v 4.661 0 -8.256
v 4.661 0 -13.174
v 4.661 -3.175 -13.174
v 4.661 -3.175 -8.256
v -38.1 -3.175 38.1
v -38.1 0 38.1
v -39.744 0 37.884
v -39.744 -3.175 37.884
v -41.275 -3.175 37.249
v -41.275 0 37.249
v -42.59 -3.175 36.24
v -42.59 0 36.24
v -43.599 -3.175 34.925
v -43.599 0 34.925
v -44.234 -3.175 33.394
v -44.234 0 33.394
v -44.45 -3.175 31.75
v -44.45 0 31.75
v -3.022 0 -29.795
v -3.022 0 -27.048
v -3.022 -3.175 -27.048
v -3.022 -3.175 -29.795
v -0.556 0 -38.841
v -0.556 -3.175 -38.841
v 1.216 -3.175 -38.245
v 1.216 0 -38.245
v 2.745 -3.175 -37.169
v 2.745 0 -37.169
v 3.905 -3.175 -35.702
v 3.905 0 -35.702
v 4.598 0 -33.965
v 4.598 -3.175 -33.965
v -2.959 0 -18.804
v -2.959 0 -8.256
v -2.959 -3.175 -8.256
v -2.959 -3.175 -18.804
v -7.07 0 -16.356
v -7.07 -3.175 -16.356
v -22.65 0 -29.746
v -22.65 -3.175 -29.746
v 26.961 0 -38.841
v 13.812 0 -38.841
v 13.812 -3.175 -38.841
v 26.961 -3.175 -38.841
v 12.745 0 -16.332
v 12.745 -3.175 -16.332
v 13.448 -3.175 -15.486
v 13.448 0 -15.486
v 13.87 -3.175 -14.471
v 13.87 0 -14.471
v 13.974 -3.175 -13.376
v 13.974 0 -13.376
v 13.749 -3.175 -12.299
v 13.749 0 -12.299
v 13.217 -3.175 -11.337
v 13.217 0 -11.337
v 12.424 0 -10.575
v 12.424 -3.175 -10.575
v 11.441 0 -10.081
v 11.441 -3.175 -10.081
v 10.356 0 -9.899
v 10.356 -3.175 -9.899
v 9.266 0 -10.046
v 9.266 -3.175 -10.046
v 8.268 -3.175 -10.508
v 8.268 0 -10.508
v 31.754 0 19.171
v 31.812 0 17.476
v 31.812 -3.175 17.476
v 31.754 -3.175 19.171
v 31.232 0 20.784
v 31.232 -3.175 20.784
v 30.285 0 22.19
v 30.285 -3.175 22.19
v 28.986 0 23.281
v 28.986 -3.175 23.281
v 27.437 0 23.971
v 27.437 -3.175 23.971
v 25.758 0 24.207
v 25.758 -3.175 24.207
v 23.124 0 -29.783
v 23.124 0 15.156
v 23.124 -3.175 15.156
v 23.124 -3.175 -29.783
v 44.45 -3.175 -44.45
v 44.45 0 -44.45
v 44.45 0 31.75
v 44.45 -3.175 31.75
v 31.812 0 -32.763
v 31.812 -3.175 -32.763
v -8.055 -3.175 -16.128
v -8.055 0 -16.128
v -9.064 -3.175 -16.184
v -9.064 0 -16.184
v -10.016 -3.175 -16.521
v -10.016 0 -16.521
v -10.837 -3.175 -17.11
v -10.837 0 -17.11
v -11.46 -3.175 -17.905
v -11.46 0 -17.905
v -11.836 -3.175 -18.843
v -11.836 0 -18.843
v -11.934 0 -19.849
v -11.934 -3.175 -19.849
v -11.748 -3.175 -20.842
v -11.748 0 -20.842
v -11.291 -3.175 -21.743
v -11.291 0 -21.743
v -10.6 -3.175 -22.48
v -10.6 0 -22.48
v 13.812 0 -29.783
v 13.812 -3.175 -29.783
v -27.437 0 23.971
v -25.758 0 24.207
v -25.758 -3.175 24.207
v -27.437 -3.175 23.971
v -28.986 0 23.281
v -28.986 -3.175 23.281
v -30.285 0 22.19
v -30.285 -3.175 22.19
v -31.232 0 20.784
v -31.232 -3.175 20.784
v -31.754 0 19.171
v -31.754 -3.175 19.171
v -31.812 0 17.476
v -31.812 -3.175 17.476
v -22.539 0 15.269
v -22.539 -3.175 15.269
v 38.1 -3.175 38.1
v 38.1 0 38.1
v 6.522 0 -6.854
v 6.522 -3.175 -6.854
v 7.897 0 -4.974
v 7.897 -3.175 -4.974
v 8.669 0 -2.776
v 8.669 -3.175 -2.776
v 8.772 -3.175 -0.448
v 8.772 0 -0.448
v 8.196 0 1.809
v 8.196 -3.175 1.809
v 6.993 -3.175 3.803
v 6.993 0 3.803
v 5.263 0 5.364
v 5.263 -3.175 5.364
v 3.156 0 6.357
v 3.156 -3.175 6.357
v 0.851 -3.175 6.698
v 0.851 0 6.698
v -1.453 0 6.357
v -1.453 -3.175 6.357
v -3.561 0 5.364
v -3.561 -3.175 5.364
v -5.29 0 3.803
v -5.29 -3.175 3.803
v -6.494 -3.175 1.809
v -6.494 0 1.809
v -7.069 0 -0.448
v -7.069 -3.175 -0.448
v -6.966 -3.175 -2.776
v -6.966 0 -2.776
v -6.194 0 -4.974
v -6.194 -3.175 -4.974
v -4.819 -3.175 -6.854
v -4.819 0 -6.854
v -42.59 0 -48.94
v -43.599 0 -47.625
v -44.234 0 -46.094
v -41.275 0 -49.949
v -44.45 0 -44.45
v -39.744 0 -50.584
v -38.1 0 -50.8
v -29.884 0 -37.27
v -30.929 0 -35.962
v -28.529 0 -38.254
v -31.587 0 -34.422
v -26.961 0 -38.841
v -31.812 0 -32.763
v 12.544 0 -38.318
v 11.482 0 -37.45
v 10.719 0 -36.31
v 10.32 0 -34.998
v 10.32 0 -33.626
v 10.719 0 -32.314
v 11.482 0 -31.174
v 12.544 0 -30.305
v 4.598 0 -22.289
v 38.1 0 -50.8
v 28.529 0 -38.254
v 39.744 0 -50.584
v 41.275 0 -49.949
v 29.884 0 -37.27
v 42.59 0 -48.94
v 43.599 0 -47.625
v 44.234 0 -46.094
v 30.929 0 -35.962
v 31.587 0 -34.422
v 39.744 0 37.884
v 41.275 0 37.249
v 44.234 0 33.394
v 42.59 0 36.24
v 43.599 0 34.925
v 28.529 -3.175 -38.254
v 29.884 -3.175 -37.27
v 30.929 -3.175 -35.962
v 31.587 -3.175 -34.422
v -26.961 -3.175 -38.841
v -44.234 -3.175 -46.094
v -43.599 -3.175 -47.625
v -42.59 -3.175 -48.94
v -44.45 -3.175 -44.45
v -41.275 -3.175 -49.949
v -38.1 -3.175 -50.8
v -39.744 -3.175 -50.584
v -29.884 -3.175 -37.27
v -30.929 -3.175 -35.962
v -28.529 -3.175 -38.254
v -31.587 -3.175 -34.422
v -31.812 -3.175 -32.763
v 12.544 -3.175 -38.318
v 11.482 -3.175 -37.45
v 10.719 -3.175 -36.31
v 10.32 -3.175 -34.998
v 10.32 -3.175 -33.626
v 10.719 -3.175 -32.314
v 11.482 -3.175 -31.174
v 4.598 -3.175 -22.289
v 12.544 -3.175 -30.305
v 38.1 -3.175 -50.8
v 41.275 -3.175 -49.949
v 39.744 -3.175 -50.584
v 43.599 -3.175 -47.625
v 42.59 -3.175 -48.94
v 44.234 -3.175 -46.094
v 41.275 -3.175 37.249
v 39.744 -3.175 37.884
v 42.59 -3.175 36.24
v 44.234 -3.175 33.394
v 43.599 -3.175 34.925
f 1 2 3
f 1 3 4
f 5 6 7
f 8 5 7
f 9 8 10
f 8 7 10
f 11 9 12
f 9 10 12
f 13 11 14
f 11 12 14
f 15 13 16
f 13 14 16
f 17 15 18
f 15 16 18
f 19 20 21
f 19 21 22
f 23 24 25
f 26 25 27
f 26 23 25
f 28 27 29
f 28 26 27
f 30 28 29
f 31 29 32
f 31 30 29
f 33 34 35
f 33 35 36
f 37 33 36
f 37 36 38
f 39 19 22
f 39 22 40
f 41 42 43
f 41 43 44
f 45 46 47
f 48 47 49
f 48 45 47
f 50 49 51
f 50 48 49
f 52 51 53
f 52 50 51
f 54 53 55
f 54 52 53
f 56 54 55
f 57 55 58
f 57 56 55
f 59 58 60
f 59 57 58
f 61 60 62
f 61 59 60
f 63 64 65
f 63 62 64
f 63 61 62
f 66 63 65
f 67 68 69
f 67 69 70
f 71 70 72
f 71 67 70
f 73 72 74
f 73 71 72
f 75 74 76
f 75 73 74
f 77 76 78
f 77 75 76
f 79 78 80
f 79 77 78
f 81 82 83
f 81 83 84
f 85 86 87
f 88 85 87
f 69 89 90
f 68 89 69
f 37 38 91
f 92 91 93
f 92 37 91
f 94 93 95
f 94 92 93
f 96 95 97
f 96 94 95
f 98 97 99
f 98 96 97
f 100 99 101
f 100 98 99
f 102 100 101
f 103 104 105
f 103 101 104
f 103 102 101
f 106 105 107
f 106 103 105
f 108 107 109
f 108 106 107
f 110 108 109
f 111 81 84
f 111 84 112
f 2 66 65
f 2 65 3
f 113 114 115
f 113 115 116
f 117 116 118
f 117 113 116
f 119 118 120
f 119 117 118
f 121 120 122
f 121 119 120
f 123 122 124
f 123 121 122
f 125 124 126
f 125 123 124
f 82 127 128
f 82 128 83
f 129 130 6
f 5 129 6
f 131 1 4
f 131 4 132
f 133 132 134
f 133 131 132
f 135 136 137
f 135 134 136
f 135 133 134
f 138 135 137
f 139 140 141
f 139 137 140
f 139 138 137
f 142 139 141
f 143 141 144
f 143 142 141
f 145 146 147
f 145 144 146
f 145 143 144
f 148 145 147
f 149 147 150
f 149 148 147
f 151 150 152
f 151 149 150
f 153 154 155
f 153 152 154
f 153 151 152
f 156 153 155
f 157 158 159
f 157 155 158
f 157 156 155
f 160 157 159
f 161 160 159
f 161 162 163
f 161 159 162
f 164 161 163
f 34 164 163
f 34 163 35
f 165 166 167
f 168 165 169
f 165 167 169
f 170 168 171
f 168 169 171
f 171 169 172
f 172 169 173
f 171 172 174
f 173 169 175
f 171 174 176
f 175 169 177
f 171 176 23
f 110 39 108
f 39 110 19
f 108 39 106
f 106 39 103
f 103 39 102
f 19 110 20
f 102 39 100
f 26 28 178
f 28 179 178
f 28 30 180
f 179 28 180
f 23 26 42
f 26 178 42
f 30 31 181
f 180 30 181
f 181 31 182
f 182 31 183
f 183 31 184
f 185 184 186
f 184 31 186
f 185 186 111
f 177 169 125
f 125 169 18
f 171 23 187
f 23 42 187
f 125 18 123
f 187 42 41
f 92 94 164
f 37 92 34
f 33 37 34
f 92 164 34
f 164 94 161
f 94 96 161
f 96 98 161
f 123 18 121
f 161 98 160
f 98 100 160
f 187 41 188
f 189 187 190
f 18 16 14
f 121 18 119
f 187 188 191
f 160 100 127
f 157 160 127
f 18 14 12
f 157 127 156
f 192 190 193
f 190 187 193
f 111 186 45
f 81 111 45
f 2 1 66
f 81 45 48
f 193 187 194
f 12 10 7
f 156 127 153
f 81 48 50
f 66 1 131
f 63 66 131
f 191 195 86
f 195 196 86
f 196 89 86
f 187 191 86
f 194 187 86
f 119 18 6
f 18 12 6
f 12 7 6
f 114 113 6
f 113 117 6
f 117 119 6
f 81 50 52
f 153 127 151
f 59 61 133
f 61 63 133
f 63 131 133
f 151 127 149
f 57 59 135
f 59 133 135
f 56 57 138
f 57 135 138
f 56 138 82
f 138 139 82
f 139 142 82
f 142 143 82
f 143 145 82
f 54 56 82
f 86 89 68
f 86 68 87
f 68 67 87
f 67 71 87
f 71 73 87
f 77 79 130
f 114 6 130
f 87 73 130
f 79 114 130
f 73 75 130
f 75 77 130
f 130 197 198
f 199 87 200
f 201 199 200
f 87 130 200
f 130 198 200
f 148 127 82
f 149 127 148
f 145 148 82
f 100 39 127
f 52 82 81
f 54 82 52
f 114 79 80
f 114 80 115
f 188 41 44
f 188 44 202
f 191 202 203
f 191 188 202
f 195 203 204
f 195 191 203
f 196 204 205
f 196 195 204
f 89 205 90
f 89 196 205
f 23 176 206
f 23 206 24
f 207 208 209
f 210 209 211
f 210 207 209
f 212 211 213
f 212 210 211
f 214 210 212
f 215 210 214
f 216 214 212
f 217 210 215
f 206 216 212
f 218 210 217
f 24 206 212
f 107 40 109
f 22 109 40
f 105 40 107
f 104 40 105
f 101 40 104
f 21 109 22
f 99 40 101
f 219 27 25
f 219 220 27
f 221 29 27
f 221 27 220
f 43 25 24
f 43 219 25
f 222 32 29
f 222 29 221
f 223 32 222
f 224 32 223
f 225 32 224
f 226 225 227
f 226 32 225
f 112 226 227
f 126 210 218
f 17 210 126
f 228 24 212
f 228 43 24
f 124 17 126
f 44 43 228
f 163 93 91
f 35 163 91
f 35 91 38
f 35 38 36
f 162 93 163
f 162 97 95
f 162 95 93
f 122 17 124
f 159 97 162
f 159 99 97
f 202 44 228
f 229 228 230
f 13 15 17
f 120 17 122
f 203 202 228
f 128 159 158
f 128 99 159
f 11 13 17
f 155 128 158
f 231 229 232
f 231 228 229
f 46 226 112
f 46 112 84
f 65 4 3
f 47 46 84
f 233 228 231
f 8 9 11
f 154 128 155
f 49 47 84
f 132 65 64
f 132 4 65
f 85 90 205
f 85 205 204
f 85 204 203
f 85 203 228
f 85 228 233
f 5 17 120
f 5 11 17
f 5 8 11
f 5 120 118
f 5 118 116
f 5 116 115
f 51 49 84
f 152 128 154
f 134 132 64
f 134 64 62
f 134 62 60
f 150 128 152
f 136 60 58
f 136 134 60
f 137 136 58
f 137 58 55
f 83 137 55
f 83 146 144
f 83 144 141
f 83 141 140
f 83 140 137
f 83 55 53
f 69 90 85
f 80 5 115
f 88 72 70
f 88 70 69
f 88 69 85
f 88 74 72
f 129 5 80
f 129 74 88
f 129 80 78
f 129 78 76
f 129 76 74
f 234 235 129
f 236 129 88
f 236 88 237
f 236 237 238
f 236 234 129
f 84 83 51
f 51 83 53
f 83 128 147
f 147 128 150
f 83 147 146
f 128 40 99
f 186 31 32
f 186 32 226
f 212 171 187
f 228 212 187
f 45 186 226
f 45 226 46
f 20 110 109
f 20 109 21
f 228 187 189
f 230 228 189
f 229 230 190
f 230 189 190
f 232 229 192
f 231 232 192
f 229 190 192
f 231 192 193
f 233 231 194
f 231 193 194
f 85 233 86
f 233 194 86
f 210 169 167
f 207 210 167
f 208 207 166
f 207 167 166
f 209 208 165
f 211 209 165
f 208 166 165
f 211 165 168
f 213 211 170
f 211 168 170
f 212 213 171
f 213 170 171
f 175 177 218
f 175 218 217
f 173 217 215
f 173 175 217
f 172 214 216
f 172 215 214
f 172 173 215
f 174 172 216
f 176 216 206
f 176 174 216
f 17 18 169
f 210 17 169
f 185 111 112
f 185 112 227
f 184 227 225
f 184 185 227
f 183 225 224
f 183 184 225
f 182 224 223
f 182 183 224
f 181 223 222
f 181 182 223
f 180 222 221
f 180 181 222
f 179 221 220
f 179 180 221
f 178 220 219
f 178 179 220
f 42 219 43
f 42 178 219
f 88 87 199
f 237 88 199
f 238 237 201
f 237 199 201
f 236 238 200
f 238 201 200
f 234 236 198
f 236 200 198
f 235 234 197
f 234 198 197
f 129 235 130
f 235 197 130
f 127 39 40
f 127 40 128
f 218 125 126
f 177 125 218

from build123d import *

# Parameters (mm, degrees)
F2_DEPTH = 3.175
F3_DEPTH = 6.35


# Not quite as in the source:
# - a feature of the source that left no trace in its solid (it failed there, or was rolled back) is left out


with BuildPart() as f2:
    # F1 (on Front) → F2 (new body)
    with BuildSketch(Plane.XZ):
        with BuildLine():
            Line((38.1, 38.1), (-38.1, 38.1))
            ThreePointArc((-38.1, 38.1), (-42.5901280605, 36.2401280605), (-44.45, 31.75))
            Line((-44.45, 31.75), (-44.45, -44.45))
            ThreePointArc((-44.45, -44.45), (-42.5901280605, -48.9401280605), (-38.1, -50.8))
            Line((-38.1, -50.8), (38.1, -50.8))
            ThreePointArc((38.1, -50.8), (42.5901280605, -48.9401280605), (44.45, -44.45))
            Line((44.45, -44.45), (44.45, 31.75))
            ThreePointArc((44.45, 31.75), (42.5901280605, 36.2401280605), (38.1, 38.1))
        make_face()
    extrude(amount=F2_DEPTH)

    # F0 (on Front) → F3 (cut)
    with BuildSketch(Plane.XZ):
        with BuildLine():
            Line((-22.538606504, 15.2688146872), (23.1240657176, 15.1560609504))
            Line((23.1240657176, 15.1560609504), (23.1240657176, -29.7829657793))
            Line((23.1240657176, -29.7829657793), (13.8122134028, -29.7829657793))
            ThreePointArc((13.8122134028, -29.7829657793), (10.2694431158, -34.3118906021), (13.8122134028, -38.8408154249))
            Line((13.8122134028, -38.8408154249), (26.9613731652, -38.8408154249))
            ThreePointArc((26.9613731652, -38.8408154249), (30.4505025307, -36.6511380231), (31.8117402494, -32.7632410691))
            Line((31.8117402494, -32.7632410691), (31.8117402494, 17.4764426589))
            ThreePointArc((31.8117402494, 17.4764426589), (30.2845461796, 22.1904359309), (25.758318603, 24.2071952671))
            Line((25.758318603, 24.2071952671), (0, 24.2071952671))
            Line((0, 24.2071952671), (-25.758318603, 24.2071952671))
            ThreePointArc((-25.758318603, 24.2071952671), (-30.2845461796, 22.1904359309), (-31.8117402494, 17.4764426589))
            Line((-31.8117402494, 17.4764426589), (-31.8117402494, -32.7632410691))
            ThreePointArc((-31.8117402494, -32.7632410691), (-30.4505025307, -36.6511380231), (-26.9613731652, -38.8408154249))
            Line((-26.9613731652, -38.8408154249), (-0.5563573561, -38.8408154249))
            ThreePointArc((-0.5563573561, -38.8408154249), (2.7454534653, -37.1689483611), (4.597785615, -33.964894712))
            Line((4.597785615, -33.964894712), (4.597785615, -22.288704291))
            Line((4.597785615, -22.288704291), (12.7450192465, -16.3317304105))
            ThreePointArc((12.7450192465, -16.3317304105), (13.2165532375, -11.3368660938), (8.2683697798, -10.508316569))
            Line((8.2683697798, -10.508316569), (4.6611472023, -13.1736341055))
            Line((4.6611472023, -13.1736341055), (4.6611472023, -8.2560405135))
            ThreePointArc((4.6611472023, -8.2560405135), (0.8511472023, 6.6980150241), (-2.9588527977, -8.2560405135))
            Line((-2.9588527977, -8.2560405135), (-2.9588527977, -18.8035315381))
            Line((-2.9588527977, -18.8035315381), (-7.0704589598, -16.3561142981))
            ThreePointArc((-7.0704589598, -16.3561142981), (-11.4601778268, -17.9054311979), (-10.6000266969, -22.4803797901))
            Line((-10.6000266969, -22.4803797901), (-3.022214385, -27.0476285368))
            Line((-3.022214385, -27.0476285368), (-3.022214385, -29.7946484487))
            Line((-3.022214385, -29.7946484487), (-22.6497609527, -29.7461826206))
            Line((-22.6497609527, -29.7461826206), (-22.538606504, 15.2688146872))
        make_face()
    extrude(amount=F3_DEPTH, mode=Mode.SUBTRACT)


solid = f2.part
